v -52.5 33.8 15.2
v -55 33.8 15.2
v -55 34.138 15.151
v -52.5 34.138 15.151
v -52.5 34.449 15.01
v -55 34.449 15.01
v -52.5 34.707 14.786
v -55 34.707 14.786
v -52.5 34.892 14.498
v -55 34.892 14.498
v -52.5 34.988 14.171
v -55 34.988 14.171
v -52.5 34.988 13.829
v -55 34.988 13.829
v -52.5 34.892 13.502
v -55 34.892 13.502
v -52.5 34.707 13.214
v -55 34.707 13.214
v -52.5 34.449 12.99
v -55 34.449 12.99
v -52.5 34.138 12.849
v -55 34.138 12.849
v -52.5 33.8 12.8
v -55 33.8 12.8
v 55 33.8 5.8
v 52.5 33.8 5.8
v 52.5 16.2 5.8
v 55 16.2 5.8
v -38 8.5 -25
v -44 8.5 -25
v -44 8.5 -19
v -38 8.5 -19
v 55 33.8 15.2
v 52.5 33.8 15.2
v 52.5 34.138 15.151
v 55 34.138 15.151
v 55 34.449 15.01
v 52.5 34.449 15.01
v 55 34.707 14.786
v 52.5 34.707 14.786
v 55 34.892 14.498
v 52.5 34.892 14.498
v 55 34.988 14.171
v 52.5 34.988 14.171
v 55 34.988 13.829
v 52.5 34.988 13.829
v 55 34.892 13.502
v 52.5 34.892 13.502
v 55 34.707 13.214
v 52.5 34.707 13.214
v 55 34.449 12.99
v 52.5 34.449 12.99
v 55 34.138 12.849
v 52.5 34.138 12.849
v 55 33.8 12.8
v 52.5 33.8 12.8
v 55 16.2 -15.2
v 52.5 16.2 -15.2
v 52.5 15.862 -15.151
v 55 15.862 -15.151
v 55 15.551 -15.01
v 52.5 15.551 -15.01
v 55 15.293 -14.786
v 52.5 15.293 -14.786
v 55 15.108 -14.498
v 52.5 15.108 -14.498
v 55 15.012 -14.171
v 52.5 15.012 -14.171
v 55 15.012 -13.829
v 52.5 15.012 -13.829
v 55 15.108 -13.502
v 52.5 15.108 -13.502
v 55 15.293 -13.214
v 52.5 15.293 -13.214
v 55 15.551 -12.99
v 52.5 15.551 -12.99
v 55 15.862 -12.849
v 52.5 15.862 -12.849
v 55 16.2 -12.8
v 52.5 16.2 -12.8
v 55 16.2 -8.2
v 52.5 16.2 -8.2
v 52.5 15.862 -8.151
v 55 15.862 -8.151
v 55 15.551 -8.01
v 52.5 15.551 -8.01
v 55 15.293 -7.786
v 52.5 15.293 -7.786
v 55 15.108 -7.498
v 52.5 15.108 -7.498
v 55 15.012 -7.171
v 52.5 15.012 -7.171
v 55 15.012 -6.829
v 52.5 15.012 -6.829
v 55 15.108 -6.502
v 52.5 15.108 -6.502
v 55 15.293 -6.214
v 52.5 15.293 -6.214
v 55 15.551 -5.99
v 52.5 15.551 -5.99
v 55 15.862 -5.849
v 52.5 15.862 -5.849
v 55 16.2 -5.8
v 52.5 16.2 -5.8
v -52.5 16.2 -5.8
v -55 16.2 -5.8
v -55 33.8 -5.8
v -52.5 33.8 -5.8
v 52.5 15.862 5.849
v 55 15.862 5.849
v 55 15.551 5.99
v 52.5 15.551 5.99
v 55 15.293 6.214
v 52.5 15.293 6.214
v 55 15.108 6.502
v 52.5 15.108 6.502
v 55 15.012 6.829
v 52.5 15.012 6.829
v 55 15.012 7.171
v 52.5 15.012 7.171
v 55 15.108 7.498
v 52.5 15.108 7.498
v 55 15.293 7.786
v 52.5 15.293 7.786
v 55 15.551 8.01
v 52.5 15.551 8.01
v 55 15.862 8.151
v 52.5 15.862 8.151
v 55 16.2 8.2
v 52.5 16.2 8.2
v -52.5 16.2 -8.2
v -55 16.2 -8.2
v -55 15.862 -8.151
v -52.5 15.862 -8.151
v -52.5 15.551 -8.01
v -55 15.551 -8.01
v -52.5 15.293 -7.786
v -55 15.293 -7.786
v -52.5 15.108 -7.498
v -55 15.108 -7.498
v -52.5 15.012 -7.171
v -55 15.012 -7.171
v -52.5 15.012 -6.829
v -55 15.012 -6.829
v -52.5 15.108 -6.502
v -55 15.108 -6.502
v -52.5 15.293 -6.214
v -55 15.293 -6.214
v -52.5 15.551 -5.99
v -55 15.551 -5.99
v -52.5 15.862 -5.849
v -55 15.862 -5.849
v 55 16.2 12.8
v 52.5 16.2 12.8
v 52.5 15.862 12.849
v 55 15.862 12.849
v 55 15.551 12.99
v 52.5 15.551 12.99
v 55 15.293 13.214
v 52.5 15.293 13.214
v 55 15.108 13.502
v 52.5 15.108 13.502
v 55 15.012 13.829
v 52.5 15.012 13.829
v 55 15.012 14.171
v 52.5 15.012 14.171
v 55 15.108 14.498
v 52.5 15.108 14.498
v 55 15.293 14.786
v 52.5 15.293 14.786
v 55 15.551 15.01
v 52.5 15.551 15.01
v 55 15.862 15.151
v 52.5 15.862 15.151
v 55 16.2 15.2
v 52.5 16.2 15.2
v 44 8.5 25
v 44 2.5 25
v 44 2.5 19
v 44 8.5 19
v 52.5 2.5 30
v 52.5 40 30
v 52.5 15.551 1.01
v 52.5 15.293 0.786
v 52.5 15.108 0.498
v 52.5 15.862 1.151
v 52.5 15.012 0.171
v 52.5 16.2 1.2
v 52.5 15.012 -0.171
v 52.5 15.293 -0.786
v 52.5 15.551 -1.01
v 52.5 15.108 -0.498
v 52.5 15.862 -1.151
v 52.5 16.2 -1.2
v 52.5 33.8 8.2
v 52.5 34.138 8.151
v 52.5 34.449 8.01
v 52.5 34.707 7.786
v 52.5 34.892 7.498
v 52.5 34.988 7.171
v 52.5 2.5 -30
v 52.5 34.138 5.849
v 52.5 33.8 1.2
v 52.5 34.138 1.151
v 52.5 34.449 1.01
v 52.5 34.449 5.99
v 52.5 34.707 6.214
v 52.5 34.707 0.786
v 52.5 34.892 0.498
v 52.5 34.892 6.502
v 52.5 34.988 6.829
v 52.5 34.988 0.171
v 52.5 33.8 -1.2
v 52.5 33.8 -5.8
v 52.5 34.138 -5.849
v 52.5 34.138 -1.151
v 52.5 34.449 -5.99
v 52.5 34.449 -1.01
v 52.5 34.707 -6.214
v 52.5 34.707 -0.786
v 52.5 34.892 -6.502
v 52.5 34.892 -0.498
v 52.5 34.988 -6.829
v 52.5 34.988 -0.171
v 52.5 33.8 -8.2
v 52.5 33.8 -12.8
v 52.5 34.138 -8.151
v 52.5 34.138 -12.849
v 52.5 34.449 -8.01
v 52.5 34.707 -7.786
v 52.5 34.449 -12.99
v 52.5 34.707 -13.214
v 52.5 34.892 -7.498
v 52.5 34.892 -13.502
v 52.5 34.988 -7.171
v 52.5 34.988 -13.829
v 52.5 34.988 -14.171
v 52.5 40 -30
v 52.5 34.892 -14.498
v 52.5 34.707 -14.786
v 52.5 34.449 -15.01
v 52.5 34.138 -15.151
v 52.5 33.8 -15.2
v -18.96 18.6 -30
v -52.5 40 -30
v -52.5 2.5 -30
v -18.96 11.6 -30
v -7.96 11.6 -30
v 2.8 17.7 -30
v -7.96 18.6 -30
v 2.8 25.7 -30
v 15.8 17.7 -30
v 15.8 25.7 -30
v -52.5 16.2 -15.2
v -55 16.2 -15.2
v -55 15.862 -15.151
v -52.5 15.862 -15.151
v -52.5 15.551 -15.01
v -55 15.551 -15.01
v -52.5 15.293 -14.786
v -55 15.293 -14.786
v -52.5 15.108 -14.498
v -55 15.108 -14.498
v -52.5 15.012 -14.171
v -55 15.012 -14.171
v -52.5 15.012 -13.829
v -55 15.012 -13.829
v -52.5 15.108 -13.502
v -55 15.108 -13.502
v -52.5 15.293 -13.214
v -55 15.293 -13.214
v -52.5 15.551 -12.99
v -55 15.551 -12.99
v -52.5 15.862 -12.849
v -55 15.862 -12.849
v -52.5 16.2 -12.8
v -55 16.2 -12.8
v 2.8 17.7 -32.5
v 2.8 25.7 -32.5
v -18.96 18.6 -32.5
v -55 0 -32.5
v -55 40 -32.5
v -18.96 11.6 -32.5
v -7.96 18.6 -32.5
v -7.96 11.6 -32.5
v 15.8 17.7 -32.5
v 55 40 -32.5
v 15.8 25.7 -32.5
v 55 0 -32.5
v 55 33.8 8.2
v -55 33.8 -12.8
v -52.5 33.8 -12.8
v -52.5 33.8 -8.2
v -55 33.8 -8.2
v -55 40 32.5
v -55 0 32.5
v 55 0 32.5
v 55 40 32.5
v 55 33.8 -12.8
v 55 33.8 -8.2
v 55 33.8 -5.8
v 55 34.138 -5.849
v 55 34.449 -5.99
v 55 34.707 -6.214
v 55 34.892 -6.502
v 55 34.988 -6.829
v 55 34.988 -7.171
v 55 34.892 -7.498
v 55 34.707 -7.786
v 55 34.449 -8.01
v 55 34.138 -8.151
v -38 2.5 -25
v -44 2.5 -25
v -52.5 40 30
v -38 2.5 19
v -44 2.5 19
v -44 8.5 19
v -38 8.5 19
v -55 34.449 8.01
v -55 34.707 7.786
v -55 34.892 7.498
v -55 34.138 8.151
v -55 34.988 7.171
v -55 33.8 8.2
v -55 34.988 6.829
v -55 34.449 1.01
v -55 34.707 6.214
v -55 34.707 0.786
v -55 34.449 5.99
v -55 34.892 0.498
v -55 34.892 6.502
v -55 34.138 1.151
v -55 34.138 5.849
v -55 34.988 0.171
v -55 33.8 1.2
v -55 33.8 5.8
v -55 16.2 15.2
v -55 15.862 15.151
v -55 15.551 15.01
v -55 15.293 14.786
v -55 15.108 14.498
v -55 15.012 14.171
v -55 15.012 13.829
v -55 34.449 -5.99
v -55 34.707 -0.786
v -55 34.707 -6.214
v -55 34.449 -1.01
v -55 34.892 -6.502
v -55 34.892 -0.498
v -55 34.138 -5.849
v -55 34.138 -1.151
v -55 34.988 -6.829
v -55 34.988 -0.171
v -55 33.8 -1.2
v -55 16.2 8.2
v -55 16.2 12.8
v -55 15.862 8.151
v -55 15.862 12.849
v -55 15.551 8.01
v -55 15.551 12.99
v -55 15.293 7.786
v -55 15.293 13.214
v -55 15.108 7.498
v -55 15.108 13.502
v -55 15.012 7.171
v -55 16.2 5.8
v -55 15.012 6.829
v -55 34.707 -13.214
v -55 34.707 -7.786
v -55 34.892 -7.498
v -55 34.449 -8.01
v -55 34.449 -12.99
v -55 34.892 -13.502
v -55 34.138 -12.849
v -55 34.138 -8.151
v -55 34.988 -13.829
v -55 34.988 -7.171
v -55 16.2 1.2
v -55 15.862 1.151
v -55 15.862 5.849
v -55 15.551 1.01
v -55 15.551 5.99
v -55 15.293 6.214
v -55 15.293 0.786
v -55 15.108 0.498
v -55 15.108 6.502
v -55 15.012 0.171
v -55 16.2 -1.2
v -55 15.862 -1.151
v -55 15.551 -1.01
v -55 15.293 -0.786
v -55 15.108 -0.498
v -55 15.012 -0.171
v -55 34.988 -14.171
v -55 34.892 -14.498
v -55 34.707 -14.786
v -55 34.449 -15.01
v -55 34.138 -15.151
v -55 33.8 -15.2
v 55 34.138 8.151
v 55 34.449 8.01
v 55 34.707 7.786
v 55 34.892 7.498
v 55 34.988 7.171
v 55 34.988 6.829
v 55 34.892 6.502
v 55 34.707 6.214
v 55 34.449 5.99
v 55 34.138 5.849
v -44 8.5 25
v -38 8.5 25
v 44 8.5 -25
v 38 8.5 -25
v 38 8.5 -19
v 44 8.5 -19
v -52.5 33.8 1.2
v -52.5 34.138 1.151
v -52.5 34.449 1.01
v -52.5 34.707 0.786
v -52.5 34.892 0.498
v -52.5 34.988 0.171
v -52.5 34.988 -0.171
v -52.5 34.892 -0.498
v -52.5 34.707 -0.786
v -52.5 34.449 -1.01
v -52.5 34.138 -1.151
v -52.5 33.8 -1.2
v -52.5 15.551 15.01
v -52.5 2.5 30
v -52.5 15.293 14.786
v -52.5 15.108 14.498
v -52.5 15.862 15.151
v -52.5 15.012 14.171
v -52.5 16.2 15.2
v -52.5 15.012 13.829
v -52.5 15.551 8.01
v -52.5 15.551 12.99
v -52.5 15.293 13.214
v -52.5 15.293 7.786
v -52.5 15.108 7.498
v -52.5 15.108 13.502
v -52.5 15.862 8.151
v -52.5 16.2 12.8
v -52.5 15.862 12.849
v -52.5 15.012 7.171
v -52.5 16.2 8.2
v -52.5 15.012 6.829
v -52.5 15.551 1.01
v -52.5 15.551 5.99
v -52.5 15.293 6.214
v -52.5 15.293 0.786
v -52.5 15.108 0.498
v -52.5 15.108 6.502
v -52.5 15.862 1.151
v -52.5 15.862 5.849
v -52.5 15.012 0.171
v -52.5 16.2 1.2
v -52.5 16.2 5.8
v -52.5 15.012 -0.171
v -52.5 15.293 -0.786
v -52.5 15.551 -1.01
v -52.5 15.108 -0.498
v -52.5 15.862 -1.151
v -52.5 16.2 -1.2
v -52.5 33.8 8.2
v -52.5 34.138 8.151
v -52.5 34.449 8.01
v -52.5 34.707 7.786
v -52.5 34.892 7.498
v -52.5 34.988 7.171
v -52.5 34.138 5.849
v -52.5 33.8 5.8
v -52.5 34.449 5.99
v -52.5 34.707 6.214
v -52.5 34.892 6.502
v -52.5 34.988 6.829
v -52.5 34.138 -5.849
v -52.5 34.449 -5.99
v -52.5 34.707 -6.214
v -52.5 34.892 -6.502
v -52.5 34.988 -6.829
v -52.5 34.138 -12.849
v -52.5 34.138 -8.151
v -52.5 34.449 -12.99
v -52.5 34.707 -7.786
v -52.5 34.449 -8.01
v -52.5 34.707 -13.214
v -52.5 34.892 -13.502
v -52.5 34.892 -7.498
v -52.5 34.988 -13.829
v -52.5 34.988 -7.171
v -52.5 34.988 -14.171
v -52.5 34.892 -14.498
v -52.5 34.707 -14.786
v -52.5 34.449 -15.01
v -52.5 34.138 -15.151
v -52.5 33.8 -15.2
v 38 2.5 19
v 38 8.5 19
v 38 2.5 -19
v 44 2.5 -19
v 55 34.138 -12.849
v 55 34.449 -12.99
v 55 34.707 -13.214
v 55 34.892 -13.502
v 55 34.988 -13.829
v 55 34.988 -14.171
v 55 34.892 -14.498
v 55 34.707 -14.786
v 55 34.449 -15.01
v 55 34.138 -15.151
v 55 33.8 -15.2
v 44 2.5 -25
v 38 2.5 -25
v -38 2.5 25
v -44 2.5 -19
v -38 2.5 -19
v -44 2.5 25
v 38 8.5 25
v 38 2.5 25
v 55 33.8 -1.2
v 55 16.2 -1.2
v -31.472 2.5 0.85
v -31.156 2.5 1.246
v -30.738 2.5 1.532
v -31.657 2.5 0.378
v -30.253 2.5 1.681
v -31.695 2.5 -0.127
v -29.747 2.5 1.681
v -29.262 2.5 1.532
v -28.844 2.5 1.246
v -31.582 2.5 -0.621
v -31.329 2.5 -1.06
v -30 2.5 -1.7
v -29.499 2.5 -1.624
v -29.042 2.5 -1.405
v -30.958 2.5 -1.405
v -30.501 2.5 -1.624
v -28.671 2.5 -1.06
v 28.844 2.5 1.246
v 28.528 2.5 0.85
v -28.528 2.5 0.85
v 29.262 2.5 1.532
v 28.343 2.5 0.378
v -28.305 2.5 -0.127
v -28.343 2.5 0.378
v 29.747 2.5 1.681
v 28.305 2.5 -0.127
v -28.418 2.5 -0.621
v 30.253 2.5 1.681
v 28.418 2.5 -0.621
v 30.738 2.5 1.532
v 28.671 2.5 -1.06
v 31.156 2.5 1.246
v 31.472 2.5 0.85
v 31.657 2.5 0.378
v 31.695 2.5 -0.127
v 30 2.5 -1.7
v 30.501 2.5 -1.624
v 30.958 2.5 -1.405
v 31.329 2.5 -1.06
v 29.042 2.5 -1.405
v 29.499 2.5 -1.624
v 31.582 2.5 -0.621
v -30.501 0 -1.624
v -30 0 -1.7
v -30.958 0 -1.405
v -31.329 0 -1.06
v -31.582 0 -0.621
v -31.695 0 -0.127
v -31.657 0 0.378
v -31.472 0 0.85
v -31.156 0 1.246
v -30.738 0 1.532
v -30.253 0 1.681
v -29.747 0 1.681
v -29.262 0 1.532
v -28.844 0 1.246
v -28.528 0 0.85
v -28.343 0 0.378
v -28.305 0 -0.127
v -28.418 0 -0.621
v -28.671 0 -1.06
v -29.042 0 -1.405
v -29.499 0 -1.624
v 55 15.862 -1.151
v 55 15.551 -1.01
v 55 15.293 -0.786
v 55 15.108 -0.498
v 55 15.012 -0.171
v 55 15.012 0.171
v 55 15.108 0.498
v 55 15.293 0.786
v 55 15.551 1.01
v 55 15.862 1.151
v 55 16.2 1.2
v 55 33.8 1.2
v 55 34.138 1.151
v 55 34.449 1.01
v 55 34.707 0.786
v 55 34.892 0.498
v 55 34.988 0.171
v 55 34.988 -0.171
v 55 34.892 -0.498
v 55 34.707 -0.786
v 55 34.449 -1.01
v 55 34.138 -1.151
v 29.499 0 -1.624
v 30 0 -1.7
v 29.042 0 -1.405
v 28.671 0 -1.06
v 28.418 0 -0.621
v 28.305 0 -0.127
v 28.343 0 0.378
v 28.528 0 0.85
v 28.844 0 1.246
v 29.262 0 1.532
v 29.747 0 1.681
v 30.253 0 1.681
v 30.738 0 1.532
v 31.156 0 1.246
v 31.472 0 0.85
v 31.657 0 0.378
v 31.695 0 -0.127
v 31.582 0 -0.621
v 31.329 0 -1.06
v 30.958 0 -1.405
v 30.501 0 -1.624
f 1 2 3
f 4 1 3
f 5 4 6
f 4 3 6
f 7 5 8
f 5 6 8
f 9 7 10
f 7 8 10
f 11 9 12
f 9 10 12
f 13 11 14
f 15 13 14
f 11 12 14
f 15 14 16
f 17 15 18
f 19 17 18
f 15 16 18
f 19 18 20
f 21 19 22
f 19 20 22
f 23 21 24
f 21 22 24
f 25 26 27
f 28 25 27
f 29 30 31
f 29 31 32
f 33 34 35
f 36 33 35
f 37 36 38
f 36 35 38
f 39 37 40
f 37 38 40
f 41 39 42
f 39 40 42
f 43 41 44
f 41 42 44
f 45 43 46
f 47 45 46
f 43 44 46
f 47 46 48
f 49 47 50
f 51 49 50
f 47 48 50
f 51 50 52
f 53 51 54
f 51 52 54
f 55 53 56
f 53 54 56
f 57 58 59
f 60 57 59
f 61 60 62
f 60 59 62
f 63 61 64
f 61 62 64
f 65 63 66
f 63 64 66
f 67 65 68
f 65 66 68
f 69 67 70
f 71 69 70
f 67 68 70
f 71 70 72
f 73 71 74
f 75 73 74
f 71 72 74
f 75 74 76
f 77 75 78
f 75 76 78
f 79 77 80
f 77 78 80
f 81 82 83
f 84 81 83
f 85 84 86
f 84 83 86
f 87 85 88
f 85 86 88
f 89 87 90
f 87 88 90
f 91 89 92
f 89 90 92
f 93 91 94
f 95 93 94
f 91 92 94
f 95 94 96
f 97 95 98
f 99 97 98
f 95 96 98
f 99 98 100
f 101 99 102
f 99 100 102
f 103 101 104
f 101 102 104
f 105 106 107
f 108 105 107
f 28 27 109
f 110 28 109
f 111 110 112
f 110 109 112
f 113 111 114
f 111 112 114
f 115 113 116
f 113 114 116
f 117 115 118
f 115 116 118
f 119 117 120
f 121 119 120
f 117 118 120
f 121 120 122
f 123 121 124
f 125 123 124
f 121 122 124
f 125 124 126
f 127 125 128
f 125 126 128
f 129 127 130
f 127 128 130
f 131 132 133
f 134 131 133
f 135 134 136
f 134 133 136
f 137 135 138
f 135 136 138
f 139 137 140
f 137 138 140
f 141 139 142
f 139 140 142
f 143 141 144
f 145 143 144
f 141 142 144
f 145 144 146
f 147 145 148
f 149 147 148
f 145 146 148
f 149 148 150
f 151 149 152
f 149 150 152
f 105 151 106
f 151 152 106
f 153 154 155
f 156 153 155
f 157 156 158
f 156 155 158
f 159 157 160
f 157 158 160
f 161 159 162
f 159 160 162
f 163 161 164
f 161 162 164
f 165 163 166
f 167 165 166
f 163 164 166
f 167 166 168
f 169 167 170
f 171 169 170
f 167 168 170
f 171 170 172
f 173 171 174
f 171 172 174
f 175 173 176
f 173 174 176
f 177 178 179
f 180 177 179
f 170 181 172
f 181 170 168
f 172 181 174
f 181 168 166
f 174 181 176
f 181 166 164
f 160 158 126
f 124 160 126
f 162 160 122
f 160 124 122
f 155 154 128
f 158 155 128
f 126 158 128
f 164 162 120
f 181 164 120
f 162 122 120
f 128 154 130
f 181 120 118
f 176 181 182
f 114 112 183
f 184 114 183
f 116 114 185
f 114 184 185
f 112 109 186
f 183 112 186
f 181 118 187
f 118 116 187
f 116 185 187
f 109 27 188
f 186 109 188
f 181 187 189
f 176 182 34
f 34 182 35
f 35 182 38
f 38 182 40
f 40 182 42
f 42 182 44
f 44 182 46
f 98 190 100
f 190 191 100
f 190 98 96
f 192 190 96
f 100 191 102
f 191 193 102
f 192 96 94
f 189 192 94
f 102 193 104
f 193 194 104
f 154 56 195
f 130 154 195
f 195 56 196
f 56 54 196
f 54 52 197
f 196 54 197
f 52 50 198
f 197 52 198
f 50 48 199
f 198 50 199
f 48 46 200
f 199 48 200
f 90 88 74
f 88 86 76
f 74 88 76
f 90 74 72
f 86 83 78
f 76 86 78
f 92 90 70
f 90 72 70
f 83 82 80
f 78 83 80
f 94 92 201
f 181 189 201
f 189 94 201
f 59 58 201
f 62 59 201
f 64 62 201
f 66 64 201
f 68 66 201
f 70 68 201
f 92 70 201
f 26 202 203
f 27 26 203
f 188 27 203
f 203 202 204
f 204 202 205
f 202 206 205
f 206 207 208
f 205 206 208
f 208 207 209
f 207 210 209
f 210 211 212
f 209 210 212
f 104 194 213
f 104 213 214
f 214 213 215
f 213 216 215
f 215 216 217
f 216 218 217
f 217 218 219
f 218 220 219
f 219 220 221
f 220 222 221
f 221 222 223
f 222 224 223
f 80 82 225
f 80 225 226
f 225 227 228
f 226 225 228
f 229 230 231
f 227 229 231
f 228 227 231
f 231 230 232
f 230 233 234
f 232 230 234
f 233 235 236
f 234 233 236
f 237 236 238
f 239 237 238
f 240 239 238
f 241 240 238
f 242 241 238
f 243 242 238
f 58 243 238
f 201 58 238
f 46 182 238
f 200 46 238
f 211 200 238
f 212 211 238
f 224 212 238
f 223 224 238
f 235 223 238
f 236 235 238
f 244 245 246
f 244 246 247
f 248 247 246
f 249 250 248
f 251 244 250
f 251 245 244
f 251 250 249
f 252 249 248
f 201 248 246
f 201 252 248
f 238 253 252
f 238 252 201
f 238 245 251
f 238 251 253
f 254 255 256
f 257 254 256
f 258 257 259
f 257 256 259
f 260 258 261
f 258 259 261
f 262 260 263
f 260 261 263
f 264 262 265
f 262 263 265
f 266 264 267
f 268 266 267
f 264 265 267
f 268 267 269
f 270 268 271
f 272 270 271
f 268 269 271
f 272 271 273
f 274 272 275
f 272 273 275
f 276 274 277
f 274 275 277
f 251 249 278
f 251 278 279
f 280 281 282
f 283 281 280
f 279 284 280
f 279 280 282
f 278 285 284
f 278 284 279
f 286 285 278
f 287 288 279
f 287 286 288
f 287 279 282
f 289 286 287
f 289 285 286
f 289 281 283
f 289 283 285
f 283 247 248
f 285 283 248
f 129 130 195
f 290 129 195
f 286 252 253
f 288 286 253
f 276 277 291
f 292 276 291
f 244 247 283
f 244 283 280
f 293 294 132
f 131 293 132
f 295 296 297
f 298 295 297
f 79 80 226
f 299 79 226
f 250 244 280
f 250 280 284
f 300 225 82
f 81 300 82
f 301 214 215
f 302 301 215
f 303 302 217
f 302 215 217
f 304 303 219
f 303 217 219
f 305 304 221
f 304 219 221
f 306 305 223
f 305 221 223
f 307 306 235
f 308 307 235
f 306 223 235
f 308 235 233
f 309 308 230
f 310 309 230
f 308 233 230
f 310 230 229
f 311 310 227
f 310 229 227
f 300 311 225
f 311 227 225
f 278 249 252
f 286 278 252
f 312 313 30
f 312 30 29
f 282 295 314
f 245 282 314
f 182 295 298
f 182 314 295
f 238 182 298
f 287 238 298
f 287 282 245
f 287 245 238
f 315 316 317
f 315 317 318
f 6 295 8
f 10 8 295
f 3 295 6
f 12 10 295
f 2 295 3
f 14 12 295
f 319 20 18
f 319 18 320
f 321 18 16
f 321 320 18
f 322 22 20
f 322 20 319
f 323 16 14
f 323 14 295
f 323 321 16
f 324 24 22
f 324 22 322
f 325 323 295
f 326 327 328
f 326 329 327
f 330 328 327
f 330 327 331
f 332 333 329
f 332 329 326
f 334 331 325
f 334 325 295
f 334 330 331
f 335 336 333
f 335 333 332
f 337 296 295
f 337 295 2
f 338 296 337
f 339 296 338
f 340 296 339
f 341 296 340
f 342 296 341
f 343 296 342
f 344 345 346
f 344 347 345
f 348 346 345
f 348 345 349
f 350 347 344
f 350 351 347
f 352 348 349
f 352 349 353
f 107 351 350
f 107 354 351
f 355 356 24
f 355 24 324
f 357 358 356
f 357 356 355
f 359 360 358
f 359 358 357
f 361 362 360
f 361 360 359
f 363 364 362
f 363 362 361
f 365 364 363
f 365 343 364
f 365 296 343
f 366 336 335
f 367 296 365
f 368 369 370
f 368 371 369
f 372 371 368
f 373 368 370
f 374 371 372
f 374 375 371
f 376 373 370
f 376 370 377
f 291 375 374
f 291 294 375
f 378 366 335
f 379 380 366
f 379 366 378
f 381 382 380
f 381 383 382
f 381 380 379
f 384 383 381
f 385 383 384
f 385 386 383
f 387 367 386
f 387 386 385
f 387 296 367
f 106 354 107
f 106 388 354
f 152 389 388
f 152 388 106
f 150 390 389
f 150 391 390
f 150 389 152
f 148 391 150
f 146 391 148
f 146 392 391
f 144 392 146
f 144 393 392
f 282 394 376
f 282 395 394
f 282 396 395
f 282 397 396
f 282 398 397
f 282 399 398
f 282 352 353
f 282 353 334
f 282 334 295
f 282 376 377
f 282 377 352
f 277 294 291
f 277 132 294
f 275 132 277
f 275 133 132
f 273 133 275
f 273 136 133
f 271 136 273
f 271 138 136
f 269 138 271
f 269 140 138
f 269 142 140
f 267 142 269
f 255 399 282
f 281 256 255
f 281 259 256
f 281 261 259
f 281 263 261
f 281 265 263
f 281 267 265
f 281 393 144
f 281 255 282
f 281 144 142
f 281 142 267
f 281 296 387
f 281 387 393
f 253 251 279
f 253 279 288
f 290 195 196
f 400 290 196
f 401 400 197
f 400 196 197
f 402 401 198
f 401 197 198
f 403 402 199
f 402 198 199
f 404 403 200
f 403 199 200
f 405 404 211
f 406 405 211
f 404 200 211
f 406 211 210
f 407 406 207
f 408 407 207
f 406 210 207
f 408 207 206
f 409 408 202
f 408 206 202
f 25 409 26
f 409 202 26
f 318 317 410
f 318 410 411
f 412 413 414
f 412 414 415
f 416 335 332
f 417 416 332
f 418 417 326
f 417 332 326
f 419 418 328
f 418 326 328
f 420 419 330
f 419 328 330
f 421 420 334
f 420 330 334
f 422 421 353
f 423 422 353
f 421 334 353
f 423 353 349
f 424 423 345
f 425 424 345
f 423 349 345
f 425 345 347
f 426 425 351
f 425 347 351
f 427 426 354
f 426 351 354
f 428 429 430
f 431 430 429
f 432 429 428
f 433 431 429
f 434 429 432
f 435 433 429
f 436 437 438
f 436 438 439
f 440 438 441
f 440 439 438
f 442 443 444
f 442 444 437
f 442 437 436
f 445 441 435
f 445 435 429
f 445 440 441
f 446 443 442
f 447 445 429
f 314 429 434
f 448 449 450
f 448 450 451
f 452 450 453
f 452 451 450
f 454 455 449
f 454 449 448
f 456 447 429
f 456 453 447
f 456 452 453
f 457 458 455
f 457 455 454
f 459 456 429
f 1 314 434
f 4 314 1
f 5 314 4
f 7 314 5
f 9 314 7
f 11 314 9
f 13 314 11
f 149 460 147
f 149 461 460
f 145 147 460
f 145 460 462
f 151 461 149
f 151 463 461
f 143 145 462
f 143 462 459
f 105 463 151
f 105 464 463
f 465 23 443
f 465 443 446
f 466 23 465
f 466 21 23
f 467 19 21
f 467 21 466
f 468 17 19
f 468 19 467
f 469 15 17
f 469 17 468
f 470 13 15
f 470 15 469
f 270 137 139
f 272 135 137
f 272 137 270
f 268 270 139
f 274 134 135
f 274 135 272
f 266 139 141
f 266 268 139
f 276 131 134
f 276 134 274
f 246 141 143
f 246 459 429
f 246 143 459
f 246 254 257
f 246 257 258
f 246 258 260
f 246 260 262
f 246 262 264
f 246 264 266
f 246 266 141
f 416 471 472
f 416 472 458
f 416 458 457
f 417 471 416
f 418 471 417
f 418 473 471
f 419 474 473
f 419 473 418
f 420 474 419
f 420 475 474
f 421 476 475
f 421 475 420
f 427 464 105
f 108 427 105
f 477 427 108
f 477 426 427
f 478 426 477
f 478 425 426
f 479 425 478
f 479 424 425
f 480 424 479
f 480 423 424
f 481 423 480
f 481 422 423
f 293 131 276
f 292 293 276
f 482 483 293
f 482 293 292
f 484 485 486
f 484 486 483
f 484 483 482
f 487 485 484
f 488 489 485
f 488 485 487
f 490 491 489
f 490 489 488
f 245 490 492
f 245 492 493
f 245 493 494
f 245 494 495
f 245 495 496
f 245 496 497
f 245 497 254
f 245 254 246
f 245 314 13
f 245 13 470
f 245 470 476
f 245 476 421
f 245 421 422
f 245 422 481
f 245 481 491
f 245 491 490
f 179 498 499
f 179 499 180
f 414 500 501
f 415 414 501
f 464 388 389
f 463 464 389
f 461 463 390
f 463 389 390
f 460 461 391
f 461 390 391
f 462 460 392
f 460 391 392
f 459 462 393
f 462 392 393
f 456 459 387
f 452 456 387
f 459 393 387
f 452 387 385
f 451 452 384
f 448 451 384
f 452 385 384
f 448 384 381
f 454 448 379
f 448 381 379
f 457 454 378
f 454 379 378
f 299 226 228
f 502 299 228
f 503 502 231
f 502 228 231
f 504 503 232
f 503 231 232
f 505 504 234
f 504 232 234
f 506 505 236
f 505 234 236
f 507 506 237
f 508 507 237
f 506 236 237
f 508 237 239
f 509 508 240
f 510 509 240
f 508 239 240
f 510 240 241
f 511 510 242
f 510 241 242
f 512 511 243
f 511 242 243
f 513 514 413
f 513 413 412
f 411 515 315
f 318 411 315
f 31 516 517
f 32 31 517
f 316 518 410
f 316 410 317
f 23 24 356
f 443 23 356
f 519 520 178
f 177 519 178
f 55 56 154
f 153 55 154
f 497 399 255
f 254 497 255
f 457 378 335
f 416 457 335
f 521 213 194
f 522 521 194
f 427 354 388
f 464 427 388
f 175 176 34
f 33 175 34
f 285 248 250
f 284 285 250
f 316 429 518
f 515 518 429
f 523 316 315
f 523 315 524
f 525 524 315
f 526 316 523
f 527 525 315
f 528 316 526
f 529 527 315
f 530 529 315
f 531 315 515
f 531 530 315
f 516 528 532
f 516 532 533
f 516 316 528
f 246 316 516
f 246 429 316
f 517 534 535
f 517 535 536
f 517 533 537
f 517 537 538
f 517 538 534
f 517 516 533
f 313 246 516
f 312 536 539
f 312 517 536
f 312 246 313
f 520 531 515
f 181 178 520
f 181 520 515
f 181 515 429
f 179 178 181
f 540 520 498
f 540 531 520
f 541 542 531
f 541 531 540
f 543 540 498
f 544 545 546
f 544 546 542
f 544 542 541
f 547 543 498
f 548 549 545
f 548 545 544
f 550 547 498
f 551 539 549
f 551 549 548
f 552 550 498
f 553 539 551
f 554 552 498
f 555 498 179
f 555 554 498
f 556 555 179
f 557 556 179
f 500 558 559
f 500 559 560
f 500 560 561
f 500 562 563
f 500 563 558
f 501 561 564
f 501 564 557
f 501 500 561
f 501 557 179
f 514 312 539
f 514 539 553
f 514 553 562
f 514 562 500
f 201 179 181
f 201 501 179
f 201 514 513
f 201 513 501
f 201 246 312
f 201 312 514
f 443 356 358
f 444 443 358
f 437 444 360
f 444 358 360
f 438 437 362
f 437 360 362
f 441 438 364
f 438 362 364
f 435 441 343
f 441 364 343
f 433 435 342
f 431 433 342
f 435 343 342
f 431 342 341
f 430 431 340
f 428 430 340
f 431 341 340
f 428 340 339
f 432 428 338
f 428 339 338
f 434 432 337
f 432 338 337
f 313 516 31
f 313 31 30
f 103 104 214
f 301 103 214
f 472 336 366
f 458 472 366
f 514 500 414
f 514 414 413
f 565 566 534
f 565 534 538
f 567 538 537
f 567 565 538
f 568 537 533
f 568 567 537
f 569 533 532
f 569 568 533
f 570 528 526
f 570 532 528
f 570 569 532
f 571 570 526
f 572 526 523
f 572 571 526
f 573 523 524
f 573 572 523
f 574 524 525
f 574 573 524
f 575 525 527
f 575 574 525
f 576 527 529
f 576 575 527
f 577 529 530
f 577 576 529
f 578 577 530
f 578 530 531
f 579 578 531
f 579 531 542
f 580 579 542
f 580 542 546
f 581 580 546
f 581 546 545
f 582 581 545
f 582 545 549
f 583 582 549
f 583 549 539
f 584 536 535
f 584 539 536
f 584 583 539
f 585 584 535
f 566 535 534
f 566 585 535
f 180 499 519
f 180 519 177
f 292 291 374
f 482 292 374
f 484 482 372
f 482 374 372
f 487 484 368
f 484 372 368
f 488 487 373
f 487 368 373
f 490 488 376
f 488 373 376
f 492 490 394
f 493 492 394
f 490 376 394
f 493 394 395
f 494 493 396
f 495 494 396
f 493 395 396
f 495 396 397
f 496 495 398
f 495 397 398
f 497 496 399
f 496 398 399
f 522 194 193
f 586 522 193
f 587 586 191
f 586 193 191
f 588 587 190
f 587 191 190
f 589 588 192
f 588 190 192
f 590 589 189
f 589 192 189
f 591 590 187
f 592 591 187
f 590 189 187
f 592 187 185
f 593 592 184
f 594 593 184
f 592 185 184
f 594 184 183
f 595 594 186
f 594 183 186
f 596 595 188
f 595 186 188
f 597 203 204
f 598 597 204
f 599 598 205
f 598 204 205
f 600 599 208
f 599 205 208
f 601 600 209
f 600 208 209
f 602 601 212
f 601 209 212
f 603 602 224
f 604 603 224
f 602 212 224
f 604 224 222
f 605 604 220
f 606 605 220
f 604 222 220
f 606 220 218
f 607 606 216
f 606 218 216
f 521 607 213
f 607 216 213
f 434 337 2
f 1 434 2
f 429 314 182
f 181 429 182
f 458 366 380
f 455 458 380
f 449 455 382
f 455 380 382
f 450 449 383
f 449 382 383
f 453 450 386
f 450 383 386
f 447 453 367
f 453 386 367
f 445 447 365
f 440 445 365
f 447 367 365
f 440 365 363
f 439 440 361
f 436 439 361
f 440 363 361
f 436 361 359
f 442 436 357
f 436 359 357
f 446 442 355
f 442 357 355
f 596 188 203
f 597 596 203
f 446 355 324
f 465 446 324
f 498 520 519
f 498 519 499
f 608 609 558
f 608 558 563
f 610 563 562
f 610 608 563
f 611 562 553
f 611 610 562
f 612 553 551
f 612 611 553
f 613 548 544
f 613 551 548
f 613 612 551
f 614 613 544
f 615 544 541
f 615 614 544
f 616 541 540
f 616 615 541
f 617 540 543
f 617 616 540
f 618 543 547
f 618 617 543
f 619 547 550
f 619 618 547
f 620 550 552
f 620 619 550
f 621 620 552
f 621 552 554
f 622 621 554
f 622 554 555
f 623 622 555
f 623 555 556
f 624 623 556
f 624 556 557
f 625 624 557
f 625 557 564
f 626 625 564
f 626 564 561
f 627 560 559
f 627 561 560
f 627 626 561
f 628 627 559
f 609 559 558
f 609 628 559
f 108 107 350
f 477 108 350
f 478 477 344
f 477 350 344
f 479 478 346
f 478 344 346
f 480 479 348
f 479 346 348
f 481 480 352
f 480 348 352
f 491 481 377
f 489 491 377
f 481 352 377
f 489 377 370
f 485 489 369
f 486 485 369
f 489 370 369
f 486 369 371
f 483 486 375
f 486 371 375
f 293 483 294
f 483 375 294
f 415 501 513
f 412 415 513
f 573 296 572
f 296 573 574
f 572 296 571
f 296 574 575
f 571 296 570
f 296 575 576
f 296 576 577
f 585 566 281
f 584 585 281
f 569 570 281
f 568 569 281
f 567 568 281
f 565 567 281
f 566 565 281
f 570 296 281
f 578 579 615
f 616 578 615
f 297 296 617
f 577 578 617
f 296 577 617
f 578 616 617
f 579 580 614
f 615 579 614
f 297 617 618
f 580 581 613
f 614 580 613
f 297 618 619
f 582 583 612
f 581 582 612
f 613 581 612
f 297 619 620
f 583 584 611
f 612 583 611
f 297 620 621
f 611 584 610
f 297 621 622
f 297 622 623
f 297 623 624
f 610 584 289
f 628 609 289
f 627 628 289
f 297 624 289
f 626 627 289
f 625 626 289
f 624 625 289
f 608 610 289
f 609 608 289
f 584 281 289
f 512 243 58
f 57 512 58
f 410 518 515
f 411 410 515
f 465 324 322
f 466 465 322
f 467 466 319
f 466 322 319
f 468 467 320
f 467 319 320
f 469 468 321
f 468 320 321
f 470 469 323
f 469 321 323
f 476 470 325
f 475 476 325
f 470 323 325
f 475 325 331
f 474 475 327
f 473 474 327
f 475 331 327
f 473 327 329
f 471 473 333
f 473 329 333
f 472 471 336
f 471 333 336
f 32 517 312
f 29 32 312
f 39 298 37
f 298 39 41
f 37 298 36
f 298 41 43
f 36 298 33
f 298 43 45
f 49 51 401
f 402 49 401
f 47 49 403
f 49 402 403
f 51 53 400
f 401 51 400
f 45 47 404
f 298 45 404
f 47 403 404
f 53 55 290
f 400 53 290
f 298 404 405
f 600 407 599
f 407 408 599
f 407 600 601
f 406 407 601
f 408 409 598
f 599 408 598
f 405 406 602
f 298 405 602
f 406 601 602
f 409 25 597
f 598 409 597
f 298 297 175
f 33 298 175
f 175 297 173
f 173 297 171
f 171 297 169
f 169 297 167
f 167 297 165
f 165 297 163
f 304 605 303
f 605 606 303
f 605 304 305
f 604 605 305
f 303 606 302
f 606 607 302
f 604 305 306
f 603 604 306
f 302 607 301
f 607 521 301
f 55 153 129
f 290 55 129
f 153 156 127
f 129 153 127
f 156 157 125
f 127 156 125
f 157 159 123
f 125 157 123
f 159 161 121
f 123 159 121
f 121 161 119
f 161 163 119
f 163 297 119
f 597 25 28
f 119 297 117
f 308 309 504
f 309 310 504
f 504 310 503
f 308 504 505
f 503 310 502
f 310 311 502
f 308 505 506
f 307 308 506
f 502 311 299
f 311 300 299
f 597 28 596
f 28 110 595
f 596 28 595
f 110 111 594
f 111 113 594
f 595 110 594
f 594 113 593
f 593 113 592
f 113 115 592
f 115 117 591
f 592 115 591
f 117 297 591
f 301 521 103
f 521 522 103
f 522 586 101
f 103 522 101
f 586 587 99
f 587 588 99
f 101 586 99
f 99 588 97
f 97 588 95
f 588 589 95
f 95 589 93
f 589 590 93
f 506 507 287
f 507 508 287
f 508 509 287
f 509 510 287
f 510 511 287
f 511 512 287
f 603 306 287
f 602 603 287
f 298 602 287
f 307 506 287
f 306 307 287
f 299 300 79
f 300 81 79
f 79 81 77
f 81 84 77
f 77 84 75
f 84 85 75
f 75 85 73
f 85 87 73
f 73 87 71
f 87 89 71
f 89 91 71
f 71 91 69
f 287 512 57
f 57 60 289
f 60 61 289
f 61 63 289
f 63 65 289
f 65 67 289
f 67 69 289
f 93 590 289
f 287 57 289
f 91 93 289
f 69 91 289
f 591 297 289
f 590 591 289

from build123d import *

# Parameters (mm, degrees)
CROQUIS_CONTORNO_W            = 110
CROQUIS_CONTORNO_H            = 65
CUERPO_DEPTH                  = 40
CROQUIS_VACIADO_W             = 105
CROQUIS_VACIADO_H             = 60
VACIADO_DEPTH                 = 37.5
CROQUIS_APOYOS_PCB_W          = 6
CROQUIS_APOYOS_PCB_H          = 6
APOYOS_PCB_DEPTH              = 6
CROQUIS_SALIDAS_W             = 13
CROQUIS_SALIDAS_H             = 8
CROQUIS_SALIDAS_W_2           = 11
CROQUIS_SALIDAS_H_2           = 7
SALIDAS_USB_Y_PANEL_DEPTH     = 76.374067158
VENTILAS_LATERALES_DEPTH      = 76.374067158
VENTILAS_LATERALES_DEPTH_BACK = 76.374067158
AGUJEROS_M3_DEPTH             = 76.374067158
AGUJEROS_M3_DEPTH_BACK        = 76.374067158
CROQUIS_TORNILLOS_R           = 1.7


with BuildPart() as part:
    # Croquis_contorno → Cuerpo (new body)
    with BuildSketch(Plane(origin=(0, 0, 0), x_dir=(1, 0, 0), z_dir=(0, 1, 0))):
        Rectangle(CROQUIS_CONTORNO_W, CROQUIS_CONTORNO_H)
    extrude(amount=CUERPO_DEPTH)

    # Croquis_vaciado → Vaciado (cut)
    with BuildSketch(Plane(origin=(0, 40, 0), x_dir=(1, 0, 0), z_dir=(0, 1, 0))):
        Rectangle(CROQUIS_VACIADO_W, CROQUIS_VACIADO_H)
    extrude(amount=-VACIADO_DEPTH, mode=Mode.SUBTRACT)

    # Croquis_apoyos_pcb → Apoyos_PCB (add)
    with BuildSketch(Plane(origin=(0, 2.5, 0), x_dir=(1, 0, 0), z_dir=(0, 1, 0))):
        with Locations((-41, 22)):
            Rectangle(CROQUIS_APOYOS_PCB_W, CROQUIS_APOYOS_PCB_H)
        with Locations((-41, -22)):
            Rectangle(CROQUIS_APOYOS_PCB_W, CROQUIS_APOYOS_PCB_H)
        with Locations((41, 22)):
            Rectangle(CROQUIS_APOYOS_PCB_W, CROQUIS_APOYOS_PCB_H)
        with Locations((41, -22)):
            Rectangle(CROQUIS_APOYOS_PCB_W, CROQUIS_APOYOS_PCB_H)
    extrude(amount=APOYOS_PCB_DEPTH)

    # Croquis_salidas → Salidas_USB_y_panel (cut, through all)
    with BuildSketch(Plane.XY):
        with Locations((9.3, 21.7)):
            Rectangle(CROQUIS_SALIDAS_W, CROQUIS_SALIDAS_H)
        with Locations((-13.46, 15.1)):
            Rectangle(CROQUIS_SALIDAS_W_2, CROQUIS_SALIDAS_H_2)
    extrude(amount=-SALIDAS_USB_Y_PANEL_DEPTH, mode=Mode.SUBTRACT)

    # Croquis_ventilas → Ventilas_laterales (cut, two sides: drawn at the far end of the back side and taken through both)
    with BuildSketch(Plane(origin=(0, 0, 0), x_dir=(0, 0, -1), z_dir=(1, 0, 0)).offset(-VENTILAS_LATERALES_DEPTH_BACK)):
        with BuildLine():
            Line((-15.2, 16.2), (-15.2, 33.8))
            ThreePointArc((-15.2, 33.8), (-14, 35), (-12.8, 33.8))
            Line((-12.8, 33.8), (-12.8, 16.2))
            ThreePointArc((-12.8, 16.2), (-14, 15), (-15.2, 16.2))
        make_face()
        with BuildLine():
            Line((-8.2, 16.2), (-8.2, 33.8))
            ThreePointArc((-8.2, 33.8), (-7, 35), (-5.8, 33.8))
            Line((-5.8, 33.8), (-5.8, 16.2))
            ThreePointArc((-5.8, 16.2), (-7, 15), (-8.2, 16.2))
        make_face()
        with BuildLine():
            Line((-1.2, 16.2), (-1.2, 33.8))
            ThreePointArc((-1.2, 33.8), (0, 35), (1.2, 33.8))
            Line((1.2, 33.8), (1.2, 16.2))
            ThreePointArc((1.2, 16.2), (0, 15), (-1.2, 16.2))
        make_face()
        with BuildLine():
            Line((5.8, 16.2), (5.8, 33.8))
            ThreePointArc((5.8, 33.8), (7, 35), (8.2, 33.8))
            Line((8.2, 33.8), (8.2, 16.2))
            ThreePointArc((8.2, 16.2), (7, 15), (5.8, 16.2))
        make_face()
        with BuildLine():
            Line((12.8, 16.2), (12.8, 33.8))
            ThreePointArc((12.8, 33.8), (14, 35), (15.2, 33.8))
            Line((15.2, 33.8), (15.2, 16.2))
            ThreePointArc((15.2, 16.2), (14, 15), (12.8, 16.2))
        make_face()
    extrude(amount=VENTILAS_LATERALES_DEPTH + VENTILAS_LATERALES_DEPTH_BACK, mode=Mode.SUBTRACT)

    # Croquis_tornillos → Agujeros_M3 (cut, two sides: drawn at the far end of the back side and taken through both)
    with BuildSketch(Plane(origin=(0, 0, 0), x_dir=(1, 0, 0), z_dir=(0, 1, 0)).offset(-AGUJEROS_M3_DEPTH_BACK)):
        with Locations(Location((-30, 0, 0), (0, 0, 90))):
            Circle(CROQUIS_TORNILLOS_R)
        with Locations(Location((30, 0, 0), (0, 0, 90))):
            Circle(CROQUIS_TORNILLOS_R)
    extrude(amount=AGUJEROS_M3_DEPTH + AGUJEROS_M3_DEPTH_BACK, mode=Mode.SUBTRACT)


solid = part.part
